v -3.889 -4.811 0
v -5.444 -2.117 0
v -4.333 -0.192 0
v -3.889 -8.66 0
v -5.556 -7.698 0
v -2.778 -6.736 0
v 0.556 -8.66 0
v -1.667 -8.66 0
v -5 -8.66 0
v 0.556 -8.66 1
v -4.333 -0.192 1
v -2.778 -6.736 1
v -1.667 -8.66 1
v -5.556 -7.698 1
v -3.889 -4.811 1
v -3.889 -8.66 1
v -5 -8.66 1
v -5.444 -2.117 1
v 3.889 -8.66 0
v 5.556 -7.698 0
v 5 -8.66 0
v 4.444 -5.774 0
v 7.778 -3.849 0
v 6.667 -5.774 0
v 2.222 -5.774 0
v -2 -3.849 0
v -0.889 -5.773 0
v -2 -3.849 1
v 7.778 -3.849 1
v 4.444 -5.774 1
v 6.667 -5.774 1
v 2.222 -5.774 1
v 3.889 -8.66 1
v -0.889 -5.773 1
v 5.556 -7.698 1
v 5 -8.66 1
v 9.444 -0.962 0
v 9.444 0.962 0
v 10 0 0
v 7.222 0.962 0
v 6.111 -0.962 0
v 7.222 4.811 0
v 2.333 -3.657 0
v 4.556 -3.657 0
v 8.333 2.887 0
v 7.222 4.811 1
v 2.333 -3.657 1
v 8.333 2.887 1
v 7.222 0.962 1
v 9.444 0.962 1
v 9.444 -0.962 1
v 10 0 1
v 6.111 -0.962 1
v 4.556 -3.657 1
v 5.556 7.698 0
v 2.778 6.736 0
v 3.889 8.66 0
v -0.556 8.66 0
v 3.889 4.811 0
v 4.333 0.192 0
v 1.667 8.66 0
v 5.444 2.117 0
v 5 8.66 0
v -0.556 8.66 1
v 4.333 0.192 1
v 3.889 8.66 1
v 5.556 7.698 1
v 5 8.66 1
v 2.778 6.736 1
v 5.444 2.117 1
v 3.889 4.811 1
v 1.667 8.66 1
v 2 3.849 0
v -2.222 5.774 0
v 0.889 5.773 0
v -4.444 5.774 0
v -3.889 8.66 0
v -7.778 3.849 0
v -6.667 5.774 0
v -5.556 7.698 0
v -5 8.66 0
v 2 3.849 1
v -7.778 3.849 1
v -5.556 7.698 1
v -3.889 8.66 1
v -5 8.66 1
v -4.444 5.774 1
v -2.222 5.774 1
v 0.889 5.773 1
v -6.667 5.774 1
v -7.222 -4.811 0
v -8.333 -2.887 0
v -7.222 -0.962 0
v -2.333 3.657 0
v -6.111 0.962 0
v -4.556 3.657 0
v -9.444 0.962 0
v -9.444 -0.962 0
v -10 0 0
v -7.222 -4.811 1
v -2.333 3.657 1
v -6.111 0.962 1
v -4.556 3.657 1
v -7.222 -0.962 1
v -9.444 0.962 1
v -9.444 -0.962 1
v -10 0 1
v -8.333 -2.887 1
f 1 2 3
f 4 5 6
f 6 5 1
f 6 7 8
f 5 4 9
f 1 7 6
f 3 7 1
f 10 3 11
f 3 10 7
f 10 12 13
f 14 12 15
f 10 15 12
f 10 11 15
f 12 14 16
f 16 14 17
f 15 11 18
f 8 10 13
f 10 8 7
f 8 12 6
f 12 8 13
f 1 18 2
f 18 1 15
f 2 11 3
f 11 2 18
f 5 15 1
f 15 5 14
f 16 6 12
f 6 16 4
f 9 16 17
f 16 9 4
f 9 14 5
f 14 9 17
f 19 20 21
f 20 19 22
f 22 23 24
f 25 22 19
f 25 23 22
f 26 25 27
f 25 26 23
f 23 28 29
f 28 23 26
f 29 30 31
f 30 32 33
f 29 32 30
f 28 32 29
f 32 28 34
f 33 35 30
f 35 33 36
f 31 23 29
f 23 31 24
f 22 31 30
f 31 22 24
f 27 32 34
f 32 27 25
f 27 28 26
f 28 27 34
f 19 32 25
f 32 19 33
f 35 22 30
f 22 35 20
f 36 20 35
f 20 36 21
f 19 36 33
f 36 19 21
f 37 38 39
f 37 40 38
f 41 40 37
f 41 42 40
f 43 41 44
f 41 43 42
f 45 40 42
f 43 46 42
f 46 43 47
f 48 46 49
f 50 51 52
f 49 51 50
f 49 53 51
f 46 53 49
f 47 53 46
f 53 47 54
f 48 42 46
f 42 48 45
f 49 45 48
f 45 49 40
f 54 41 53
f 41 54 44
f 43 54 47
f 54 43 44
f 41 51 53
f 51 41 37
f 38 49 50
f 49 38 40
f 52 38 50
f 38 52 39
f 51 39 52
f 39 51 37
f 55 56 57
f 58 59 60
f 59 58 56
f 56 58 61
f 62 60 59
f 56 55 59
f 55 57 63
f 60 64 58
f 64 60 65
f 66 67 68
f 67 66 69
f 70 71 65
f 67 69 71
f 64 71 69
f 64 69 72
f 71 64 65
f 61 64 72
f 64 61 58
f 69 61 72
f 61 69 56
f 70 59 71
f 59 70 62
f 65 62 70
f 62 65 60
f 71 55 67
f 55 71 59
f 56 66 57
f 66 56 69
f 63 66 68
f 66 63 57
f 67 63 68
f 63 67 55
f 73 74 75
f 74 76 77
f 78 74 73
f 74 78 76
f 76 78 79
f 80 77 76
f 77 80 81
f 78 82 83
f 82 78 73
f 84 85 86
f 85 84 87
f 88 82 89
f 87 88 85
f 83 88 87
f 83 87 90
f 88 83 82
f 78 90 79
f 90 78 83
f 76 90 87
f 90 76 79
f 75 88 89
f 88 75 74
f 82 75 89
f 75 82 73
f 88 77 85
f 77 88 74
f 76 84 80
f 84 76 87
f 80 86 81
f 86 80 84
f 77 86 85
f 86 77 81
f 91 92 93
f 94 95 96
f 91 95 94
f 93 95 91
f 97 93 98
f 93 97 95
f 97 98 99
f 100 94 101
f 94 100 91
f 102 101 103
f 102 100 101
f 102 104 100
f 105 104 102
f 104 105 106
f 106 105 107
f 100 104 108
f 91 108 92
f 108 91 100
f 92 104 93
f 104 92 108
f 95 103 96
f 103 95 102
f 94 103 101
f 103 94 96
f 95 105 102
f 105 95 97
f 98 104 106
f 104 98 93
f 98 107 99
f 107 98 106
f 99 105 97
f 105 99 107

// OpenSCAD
unit = [1, 0];
origin = [0, 0];

function rot2d(angle) = [
    [+cos(angle), -sin(angle)],
    [+sin(angle), +cos(angle)]
];

function inner_hex_points(data) = [
    for (angle = [0 : 60 : 300]) 
    dict_get(data, "scale") * rot2d(angle) * unit
];

module inner_hex(data) {
    linear_extrude(dict_get(data, "height"))
    polygon(inner_hex_points(data));
}


function lambda_points(data) =
let (
    lambda0 = [
        inner_hex_points(data)[2]
        + dict_get(data, "scale") * dict_get(data, "thickness") * rot2d(60) * unit,
        inner_hex_points(data)[5]
        + dict_get(data, "scale") * dict_get(data, "thickness") * rot2d(0) * unit,
        inner_hex_points(data)[5]
        + dict_get(data, "scale") * dict_get(data, "thickness") * rot2d(180) * unit,
        inner_hex_points(data)[2]
        + dict_get(data, "scale") * dict_get(data, "thickness") * rot2d(240) * unit,
    ],
    lambda1 = [
        origin
        + dict_get(data, "scale") * dict_get(data, "thickness") * rot2d(60) * unit
        + dict_get(data, "scale") * dict_get(data, "thickness") * rot2d(120) * unit,
        origin
        + dict_get(data, "scale") * dict_get(data, "thickness") * rot2d(60) * unit
        + dict_get(data, "scale") * dict_get(data, "thickness") * rot2d(-60) * unit,
        inner_hex_points(data)[4]
        + dict_get(data, "scale") * dict_get(data, "thickness") * rot2d(0) * unit,
        inner_hex_points(data)[4]
        + dict_get(data, "scale") * dict_get(data, "thickness") * rot2d(180) * unit,
    ]
)
[lambda0, lambda1];

function gap_points(data) = [
    inner_hex_points(data)[2]
    + dict_get(data, "scale") * dict_get(data, "thickness") * rot2d(60) * unit
    + dict_get(data, "scale") * dict_get(data, "gap") * rot2d(90) * unit,
    inner_hex_points(data)[2]
    + dict_get(data, "scale") * dict_get(data, "thickness") * rot2d(60) * unit
    + dict_get(data, "scale") * dict_get(data, "gap") * rot2d(-60) * unit,
    inner_hex_points(data)[2]
    + dict_get(data, "scale") * dict_get(data, "thickness") * rot2d(240) * unit
    + dict_get(data, "scale") * dict_get(data, "gap") * rot2d(-60) * unit,
    inner_hex_points(data)[2]
    + dict_get(data, "scale") * dict_get(data, "thickness") * rot2d(240) * unit
    + dict_get(data, "scale") * dict_get(data, "gap") * rot2d(180) * unit,
];


module lambda(data) {
    union() {
        if (dict_get(data, "gap") == 0) {
            linear_extrude(dict_get(data, "height")) polygon(lambda_points(data)[0]);
        } else
        {
            difference() {
                linear_extrude(dict_get(data, "height")) polygon(lambda_points(data)[0]);
                linear_extrude(4 * dict_get(data, "height"), center=true) polygon(gap_points(data));
            }
        }
        intersection() {
            linear_extrude(dict_get(data, "height")) polygon(lambda_points(data)[1]);
            inner_hex(data);
        }
    }
}

module flake(data) {
    for (idx = [0 : 5]) {
        rotate([0, 0, idx * 60]) 
        translate(-lambda_points(data)[0][0]) 
        translate([-dict_get(data, "scale"), 0, 0]) 
        lambda(data);
    }
}

function dict_get(dict, key) =
  dict[search([key], dict)[0]][1];

params = [
    [ "scale", 10/2.25 ],
    [ "thickness", 0.25 ],
    [ "height", 1 ],
    [ "gap", 0.05 ],
];

flake(params);
